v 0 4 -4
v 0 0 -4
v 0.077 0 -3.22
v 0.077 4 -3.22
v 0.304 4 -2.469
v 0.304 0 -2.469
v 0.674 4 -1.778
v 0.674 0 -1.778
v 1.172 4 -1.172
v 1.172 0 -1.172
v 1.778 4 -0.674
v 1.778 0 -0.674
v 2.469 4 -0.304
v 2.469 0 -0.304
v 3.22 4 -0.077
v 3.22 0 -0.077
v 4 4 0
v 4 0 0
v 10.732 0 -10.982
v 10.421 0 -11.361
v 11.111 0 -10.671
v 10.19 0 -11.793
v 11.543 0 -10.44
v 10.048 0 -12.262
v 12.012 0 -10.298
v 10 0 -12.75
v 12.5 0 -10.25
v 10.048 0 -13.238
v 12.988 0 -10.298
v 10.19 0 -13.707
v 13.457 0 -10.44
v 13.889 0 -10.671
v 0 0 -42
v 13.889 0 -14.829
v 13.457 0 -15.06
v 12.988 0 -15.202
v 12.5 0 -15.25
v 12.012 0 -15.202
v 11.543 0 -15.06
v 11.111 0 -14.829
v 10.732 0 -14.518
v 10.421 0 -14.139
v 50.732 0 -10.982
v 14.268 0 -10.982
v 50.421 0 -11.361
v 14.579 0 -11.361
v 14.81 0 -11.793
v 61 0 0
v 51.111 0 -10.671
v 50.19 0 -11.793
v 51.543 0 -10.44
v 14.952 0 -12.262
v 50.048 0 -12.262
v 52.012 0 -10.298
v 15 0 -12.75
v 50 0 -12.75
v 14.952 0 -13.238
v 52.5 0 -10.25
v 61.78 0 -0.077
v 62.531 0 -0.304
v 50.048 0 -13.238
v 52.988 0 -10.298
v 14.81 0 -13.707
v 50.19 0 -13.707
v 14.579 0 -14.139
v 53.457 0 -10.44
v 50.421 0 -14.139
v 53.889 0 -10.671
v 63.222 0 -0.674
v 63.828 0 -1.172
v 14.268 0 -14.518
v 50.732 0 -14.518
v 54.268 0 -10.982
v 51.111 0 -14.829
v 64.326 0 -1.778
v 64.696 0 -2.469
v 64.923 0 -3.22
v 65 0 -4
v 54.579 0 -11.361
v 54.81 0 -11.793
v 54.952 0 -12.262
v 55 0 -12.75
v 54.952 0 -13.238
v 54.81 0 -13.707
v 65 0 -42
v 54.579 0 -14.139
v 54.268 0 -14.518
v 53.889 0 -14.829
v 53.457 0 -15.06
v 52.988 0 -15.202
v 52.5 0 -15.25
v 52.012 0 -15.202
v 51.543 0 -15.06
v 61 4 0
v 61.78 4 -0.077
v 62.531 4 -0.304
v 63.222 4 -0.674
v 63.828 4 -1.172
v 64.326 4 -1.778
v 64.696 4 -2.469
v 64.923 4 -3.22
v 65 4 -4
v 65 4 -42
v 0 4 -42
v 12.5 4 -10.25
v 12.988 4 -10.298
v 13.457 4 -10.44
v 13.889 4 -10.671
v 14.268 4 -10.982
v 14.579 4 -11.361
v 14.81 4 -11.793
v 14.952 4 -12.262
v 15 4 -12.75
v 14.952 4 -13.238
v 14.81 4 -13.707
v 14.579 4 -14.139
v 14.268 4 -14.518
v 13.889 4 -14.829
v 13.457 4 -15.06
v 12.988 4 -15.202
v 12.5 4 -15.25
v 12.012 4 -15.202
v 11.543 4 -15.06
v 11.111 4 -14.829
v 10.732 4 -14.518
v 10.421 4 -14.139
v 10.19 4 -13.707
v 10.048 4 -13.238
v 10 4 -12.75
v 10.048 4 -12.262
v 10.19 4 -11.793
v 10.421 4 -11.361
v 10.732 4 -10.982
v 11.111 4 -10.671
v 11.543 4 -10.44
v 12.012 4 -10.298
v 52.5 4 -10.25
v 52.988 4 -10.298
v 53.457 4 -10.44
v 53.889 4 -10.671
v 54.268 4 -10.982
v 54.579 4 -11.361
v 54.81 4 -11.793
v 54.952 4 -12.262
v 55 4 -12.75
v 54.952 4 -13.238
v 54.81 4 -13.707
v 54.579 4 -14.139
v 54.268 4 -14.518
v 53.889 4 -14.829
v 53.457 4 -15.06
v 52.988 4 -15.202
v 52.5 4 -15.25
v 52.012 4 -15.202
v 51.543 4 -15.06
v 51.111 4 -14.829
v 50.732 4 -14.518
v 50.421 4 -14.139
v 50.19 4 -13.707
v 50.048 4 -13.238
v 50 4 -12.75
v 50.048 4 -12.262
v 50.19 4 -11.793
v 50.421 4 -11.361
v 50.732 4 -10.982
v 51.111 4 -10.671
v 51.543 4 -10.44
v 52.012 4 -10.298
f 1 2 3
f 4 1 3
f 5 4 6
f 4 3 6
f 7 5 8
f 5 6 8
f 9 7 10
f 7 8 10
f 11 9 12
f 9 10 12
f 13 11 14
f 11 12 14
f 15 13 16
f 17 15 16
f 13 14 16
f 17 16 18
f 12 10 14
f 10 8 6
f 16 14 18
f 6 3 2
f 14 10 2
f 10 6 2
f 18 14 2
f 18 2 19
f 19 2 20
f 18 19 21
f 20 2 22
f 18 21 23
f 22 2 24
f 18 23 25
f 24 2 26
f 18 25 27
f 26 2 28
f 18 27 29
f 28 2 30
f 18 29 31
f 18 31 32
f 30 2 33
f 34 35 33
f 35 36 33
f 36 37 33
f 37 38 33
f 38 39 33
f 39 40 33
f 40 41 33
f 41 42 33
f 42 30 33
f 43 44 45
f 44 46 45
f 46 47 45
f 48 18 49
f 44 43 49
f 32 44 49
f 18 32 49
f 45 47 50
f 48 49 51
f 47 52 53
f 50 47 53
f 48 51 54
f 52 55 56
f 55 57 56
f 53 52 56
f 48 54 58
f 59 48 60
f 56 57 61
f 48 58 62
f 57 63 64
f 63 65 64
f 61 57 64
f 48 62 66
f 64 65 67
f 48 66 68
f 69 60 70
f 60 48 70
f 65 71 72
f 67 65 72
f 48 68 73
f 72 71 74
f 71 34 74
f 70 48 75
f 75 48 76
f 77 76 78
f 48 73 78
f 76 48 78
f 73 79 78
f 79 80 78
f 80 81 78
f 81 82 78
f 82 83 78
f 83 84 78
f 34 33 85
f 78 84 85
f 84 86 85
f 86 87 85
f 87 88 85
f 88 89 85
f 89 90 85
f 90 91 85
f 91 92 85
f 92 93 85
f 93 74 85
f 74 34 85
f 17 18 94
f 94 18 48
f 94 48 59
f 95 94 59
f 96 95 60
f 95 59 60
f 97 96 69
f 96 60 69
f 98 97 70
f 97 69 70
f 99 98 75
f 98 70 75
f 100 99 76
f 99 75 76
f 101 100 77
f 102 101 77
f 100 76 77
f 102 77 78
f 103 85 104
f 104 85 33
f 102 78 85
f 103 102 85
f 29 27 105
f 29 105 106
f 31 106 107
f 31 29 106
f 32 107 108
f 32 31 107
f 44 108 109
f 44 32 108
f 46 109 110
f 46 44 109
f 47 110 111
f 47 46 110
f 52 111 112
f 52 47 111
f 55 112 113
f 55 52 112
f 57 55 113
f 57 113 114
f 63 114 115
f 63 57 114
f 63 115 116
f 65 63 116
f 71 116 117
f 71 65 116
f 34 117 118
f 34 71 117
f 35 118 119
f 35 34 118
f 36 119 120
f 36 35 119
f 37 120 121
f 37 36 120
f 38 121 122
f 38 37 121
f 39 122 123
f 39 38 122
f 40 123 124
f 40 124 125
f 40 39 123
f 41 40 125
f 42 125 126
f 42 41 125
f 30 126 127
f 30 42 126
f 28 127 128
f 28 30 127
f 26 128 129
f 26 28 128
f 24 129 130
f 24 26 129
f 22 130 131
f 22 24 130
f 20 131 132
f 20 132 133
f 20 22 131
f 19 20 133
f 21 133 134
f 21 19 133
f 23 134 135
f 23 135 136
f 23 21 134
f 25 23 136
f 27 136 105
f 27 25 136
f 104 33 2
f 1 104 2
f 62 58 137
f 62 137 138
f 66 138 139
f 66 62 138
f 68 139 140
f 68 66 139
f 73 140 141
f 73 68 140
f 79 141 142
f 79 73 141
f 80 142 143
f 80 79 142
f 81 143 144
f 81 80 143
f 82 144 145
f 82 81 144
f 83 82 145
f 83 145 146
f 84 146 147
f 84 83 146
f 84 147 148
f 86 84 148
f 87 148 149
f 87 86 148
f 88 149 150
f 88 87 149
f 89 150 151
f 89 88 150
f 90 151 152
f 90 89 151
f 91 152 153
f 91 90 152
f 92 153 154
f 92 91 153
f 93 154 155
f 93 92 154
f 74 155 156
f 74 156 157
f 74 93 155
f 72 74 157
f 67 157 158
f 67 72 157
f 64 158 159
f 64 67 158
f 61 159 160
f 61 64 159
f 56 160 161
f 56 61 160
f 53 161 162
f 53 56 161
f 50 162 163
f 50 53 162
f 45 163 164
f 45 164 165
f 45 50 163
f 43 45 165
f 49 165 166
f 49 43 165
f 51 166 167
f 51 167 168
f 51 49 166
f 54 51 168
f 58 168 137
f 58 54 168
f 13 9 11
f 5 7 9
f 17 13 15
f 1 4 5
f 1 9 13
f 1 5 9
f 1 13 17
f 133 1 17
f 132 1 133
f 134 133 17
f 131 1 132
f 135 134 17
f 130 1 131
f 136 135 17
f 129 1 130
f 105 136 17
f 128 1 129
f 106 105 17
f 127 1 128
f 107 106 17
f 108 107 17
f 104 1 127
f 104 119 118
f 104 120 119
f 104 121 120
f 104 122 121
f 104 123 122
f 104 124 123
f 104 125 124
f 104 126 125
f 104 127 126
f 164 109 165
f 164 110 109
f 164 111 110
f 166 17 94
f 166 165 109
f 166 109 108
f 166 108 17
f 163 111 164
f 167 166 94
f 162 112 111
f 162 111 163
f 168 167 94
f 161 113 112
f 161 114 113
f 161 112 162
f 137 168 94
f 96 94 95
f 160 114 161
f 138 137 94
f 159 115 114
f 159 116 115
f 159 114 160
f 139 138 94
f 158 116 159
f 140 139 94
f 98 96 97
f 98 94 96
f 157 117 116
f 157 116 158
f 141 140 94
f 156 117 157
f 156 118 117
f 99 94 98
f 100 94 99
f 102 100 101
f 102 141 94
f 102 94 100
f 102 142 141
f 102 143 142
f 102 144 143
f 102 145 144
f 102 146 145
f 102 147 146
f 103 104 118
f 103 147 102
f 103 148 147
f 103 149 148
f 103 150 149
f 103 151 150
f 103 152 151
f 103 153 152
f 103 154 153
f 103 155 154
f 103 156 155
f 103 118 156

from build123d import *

# Parameters (mm, degrees)
SKETCH1_R           = 2.5
BOSS_EXTRUDE1_DEPTH = 4


with BuildPart() as part:
    # Sketch1 → Boss-Extrude1 (new body)
    with BuildSketch(Plane(origin=(0, 0, 0), x_dir=(1, 0, 0), z_dir=(0, 1, 0))):
        with BuildLine():
            Line((4, 0), (61, 0))
            ThreePointArc((61, 0), (63.828427125, 1.171572875), (65, 4))
            Line((65, 4), (65, 42))
            Line((65, 42), (0, 42))
            Line((0, 42), (0, 4))
            ThreePointArc((0, 4), (1.171572875, 1.171572875), (4, 0))
        make_face()
        with Locations(Location((12.5, 12.75, 0), (0, 0, 270))):
            Circle(SKETCH1_R, mode=Mode.SUBTRACT)
        with Locations(Location((52.5, 12.75, 0), (0, 0, 270))):
            Circle(SKETCH1_R, mode=Mode.SUBTRACT)
    extrude(amount=BOSS_EXTRUDE1_DEPTH)


solid = part.part
